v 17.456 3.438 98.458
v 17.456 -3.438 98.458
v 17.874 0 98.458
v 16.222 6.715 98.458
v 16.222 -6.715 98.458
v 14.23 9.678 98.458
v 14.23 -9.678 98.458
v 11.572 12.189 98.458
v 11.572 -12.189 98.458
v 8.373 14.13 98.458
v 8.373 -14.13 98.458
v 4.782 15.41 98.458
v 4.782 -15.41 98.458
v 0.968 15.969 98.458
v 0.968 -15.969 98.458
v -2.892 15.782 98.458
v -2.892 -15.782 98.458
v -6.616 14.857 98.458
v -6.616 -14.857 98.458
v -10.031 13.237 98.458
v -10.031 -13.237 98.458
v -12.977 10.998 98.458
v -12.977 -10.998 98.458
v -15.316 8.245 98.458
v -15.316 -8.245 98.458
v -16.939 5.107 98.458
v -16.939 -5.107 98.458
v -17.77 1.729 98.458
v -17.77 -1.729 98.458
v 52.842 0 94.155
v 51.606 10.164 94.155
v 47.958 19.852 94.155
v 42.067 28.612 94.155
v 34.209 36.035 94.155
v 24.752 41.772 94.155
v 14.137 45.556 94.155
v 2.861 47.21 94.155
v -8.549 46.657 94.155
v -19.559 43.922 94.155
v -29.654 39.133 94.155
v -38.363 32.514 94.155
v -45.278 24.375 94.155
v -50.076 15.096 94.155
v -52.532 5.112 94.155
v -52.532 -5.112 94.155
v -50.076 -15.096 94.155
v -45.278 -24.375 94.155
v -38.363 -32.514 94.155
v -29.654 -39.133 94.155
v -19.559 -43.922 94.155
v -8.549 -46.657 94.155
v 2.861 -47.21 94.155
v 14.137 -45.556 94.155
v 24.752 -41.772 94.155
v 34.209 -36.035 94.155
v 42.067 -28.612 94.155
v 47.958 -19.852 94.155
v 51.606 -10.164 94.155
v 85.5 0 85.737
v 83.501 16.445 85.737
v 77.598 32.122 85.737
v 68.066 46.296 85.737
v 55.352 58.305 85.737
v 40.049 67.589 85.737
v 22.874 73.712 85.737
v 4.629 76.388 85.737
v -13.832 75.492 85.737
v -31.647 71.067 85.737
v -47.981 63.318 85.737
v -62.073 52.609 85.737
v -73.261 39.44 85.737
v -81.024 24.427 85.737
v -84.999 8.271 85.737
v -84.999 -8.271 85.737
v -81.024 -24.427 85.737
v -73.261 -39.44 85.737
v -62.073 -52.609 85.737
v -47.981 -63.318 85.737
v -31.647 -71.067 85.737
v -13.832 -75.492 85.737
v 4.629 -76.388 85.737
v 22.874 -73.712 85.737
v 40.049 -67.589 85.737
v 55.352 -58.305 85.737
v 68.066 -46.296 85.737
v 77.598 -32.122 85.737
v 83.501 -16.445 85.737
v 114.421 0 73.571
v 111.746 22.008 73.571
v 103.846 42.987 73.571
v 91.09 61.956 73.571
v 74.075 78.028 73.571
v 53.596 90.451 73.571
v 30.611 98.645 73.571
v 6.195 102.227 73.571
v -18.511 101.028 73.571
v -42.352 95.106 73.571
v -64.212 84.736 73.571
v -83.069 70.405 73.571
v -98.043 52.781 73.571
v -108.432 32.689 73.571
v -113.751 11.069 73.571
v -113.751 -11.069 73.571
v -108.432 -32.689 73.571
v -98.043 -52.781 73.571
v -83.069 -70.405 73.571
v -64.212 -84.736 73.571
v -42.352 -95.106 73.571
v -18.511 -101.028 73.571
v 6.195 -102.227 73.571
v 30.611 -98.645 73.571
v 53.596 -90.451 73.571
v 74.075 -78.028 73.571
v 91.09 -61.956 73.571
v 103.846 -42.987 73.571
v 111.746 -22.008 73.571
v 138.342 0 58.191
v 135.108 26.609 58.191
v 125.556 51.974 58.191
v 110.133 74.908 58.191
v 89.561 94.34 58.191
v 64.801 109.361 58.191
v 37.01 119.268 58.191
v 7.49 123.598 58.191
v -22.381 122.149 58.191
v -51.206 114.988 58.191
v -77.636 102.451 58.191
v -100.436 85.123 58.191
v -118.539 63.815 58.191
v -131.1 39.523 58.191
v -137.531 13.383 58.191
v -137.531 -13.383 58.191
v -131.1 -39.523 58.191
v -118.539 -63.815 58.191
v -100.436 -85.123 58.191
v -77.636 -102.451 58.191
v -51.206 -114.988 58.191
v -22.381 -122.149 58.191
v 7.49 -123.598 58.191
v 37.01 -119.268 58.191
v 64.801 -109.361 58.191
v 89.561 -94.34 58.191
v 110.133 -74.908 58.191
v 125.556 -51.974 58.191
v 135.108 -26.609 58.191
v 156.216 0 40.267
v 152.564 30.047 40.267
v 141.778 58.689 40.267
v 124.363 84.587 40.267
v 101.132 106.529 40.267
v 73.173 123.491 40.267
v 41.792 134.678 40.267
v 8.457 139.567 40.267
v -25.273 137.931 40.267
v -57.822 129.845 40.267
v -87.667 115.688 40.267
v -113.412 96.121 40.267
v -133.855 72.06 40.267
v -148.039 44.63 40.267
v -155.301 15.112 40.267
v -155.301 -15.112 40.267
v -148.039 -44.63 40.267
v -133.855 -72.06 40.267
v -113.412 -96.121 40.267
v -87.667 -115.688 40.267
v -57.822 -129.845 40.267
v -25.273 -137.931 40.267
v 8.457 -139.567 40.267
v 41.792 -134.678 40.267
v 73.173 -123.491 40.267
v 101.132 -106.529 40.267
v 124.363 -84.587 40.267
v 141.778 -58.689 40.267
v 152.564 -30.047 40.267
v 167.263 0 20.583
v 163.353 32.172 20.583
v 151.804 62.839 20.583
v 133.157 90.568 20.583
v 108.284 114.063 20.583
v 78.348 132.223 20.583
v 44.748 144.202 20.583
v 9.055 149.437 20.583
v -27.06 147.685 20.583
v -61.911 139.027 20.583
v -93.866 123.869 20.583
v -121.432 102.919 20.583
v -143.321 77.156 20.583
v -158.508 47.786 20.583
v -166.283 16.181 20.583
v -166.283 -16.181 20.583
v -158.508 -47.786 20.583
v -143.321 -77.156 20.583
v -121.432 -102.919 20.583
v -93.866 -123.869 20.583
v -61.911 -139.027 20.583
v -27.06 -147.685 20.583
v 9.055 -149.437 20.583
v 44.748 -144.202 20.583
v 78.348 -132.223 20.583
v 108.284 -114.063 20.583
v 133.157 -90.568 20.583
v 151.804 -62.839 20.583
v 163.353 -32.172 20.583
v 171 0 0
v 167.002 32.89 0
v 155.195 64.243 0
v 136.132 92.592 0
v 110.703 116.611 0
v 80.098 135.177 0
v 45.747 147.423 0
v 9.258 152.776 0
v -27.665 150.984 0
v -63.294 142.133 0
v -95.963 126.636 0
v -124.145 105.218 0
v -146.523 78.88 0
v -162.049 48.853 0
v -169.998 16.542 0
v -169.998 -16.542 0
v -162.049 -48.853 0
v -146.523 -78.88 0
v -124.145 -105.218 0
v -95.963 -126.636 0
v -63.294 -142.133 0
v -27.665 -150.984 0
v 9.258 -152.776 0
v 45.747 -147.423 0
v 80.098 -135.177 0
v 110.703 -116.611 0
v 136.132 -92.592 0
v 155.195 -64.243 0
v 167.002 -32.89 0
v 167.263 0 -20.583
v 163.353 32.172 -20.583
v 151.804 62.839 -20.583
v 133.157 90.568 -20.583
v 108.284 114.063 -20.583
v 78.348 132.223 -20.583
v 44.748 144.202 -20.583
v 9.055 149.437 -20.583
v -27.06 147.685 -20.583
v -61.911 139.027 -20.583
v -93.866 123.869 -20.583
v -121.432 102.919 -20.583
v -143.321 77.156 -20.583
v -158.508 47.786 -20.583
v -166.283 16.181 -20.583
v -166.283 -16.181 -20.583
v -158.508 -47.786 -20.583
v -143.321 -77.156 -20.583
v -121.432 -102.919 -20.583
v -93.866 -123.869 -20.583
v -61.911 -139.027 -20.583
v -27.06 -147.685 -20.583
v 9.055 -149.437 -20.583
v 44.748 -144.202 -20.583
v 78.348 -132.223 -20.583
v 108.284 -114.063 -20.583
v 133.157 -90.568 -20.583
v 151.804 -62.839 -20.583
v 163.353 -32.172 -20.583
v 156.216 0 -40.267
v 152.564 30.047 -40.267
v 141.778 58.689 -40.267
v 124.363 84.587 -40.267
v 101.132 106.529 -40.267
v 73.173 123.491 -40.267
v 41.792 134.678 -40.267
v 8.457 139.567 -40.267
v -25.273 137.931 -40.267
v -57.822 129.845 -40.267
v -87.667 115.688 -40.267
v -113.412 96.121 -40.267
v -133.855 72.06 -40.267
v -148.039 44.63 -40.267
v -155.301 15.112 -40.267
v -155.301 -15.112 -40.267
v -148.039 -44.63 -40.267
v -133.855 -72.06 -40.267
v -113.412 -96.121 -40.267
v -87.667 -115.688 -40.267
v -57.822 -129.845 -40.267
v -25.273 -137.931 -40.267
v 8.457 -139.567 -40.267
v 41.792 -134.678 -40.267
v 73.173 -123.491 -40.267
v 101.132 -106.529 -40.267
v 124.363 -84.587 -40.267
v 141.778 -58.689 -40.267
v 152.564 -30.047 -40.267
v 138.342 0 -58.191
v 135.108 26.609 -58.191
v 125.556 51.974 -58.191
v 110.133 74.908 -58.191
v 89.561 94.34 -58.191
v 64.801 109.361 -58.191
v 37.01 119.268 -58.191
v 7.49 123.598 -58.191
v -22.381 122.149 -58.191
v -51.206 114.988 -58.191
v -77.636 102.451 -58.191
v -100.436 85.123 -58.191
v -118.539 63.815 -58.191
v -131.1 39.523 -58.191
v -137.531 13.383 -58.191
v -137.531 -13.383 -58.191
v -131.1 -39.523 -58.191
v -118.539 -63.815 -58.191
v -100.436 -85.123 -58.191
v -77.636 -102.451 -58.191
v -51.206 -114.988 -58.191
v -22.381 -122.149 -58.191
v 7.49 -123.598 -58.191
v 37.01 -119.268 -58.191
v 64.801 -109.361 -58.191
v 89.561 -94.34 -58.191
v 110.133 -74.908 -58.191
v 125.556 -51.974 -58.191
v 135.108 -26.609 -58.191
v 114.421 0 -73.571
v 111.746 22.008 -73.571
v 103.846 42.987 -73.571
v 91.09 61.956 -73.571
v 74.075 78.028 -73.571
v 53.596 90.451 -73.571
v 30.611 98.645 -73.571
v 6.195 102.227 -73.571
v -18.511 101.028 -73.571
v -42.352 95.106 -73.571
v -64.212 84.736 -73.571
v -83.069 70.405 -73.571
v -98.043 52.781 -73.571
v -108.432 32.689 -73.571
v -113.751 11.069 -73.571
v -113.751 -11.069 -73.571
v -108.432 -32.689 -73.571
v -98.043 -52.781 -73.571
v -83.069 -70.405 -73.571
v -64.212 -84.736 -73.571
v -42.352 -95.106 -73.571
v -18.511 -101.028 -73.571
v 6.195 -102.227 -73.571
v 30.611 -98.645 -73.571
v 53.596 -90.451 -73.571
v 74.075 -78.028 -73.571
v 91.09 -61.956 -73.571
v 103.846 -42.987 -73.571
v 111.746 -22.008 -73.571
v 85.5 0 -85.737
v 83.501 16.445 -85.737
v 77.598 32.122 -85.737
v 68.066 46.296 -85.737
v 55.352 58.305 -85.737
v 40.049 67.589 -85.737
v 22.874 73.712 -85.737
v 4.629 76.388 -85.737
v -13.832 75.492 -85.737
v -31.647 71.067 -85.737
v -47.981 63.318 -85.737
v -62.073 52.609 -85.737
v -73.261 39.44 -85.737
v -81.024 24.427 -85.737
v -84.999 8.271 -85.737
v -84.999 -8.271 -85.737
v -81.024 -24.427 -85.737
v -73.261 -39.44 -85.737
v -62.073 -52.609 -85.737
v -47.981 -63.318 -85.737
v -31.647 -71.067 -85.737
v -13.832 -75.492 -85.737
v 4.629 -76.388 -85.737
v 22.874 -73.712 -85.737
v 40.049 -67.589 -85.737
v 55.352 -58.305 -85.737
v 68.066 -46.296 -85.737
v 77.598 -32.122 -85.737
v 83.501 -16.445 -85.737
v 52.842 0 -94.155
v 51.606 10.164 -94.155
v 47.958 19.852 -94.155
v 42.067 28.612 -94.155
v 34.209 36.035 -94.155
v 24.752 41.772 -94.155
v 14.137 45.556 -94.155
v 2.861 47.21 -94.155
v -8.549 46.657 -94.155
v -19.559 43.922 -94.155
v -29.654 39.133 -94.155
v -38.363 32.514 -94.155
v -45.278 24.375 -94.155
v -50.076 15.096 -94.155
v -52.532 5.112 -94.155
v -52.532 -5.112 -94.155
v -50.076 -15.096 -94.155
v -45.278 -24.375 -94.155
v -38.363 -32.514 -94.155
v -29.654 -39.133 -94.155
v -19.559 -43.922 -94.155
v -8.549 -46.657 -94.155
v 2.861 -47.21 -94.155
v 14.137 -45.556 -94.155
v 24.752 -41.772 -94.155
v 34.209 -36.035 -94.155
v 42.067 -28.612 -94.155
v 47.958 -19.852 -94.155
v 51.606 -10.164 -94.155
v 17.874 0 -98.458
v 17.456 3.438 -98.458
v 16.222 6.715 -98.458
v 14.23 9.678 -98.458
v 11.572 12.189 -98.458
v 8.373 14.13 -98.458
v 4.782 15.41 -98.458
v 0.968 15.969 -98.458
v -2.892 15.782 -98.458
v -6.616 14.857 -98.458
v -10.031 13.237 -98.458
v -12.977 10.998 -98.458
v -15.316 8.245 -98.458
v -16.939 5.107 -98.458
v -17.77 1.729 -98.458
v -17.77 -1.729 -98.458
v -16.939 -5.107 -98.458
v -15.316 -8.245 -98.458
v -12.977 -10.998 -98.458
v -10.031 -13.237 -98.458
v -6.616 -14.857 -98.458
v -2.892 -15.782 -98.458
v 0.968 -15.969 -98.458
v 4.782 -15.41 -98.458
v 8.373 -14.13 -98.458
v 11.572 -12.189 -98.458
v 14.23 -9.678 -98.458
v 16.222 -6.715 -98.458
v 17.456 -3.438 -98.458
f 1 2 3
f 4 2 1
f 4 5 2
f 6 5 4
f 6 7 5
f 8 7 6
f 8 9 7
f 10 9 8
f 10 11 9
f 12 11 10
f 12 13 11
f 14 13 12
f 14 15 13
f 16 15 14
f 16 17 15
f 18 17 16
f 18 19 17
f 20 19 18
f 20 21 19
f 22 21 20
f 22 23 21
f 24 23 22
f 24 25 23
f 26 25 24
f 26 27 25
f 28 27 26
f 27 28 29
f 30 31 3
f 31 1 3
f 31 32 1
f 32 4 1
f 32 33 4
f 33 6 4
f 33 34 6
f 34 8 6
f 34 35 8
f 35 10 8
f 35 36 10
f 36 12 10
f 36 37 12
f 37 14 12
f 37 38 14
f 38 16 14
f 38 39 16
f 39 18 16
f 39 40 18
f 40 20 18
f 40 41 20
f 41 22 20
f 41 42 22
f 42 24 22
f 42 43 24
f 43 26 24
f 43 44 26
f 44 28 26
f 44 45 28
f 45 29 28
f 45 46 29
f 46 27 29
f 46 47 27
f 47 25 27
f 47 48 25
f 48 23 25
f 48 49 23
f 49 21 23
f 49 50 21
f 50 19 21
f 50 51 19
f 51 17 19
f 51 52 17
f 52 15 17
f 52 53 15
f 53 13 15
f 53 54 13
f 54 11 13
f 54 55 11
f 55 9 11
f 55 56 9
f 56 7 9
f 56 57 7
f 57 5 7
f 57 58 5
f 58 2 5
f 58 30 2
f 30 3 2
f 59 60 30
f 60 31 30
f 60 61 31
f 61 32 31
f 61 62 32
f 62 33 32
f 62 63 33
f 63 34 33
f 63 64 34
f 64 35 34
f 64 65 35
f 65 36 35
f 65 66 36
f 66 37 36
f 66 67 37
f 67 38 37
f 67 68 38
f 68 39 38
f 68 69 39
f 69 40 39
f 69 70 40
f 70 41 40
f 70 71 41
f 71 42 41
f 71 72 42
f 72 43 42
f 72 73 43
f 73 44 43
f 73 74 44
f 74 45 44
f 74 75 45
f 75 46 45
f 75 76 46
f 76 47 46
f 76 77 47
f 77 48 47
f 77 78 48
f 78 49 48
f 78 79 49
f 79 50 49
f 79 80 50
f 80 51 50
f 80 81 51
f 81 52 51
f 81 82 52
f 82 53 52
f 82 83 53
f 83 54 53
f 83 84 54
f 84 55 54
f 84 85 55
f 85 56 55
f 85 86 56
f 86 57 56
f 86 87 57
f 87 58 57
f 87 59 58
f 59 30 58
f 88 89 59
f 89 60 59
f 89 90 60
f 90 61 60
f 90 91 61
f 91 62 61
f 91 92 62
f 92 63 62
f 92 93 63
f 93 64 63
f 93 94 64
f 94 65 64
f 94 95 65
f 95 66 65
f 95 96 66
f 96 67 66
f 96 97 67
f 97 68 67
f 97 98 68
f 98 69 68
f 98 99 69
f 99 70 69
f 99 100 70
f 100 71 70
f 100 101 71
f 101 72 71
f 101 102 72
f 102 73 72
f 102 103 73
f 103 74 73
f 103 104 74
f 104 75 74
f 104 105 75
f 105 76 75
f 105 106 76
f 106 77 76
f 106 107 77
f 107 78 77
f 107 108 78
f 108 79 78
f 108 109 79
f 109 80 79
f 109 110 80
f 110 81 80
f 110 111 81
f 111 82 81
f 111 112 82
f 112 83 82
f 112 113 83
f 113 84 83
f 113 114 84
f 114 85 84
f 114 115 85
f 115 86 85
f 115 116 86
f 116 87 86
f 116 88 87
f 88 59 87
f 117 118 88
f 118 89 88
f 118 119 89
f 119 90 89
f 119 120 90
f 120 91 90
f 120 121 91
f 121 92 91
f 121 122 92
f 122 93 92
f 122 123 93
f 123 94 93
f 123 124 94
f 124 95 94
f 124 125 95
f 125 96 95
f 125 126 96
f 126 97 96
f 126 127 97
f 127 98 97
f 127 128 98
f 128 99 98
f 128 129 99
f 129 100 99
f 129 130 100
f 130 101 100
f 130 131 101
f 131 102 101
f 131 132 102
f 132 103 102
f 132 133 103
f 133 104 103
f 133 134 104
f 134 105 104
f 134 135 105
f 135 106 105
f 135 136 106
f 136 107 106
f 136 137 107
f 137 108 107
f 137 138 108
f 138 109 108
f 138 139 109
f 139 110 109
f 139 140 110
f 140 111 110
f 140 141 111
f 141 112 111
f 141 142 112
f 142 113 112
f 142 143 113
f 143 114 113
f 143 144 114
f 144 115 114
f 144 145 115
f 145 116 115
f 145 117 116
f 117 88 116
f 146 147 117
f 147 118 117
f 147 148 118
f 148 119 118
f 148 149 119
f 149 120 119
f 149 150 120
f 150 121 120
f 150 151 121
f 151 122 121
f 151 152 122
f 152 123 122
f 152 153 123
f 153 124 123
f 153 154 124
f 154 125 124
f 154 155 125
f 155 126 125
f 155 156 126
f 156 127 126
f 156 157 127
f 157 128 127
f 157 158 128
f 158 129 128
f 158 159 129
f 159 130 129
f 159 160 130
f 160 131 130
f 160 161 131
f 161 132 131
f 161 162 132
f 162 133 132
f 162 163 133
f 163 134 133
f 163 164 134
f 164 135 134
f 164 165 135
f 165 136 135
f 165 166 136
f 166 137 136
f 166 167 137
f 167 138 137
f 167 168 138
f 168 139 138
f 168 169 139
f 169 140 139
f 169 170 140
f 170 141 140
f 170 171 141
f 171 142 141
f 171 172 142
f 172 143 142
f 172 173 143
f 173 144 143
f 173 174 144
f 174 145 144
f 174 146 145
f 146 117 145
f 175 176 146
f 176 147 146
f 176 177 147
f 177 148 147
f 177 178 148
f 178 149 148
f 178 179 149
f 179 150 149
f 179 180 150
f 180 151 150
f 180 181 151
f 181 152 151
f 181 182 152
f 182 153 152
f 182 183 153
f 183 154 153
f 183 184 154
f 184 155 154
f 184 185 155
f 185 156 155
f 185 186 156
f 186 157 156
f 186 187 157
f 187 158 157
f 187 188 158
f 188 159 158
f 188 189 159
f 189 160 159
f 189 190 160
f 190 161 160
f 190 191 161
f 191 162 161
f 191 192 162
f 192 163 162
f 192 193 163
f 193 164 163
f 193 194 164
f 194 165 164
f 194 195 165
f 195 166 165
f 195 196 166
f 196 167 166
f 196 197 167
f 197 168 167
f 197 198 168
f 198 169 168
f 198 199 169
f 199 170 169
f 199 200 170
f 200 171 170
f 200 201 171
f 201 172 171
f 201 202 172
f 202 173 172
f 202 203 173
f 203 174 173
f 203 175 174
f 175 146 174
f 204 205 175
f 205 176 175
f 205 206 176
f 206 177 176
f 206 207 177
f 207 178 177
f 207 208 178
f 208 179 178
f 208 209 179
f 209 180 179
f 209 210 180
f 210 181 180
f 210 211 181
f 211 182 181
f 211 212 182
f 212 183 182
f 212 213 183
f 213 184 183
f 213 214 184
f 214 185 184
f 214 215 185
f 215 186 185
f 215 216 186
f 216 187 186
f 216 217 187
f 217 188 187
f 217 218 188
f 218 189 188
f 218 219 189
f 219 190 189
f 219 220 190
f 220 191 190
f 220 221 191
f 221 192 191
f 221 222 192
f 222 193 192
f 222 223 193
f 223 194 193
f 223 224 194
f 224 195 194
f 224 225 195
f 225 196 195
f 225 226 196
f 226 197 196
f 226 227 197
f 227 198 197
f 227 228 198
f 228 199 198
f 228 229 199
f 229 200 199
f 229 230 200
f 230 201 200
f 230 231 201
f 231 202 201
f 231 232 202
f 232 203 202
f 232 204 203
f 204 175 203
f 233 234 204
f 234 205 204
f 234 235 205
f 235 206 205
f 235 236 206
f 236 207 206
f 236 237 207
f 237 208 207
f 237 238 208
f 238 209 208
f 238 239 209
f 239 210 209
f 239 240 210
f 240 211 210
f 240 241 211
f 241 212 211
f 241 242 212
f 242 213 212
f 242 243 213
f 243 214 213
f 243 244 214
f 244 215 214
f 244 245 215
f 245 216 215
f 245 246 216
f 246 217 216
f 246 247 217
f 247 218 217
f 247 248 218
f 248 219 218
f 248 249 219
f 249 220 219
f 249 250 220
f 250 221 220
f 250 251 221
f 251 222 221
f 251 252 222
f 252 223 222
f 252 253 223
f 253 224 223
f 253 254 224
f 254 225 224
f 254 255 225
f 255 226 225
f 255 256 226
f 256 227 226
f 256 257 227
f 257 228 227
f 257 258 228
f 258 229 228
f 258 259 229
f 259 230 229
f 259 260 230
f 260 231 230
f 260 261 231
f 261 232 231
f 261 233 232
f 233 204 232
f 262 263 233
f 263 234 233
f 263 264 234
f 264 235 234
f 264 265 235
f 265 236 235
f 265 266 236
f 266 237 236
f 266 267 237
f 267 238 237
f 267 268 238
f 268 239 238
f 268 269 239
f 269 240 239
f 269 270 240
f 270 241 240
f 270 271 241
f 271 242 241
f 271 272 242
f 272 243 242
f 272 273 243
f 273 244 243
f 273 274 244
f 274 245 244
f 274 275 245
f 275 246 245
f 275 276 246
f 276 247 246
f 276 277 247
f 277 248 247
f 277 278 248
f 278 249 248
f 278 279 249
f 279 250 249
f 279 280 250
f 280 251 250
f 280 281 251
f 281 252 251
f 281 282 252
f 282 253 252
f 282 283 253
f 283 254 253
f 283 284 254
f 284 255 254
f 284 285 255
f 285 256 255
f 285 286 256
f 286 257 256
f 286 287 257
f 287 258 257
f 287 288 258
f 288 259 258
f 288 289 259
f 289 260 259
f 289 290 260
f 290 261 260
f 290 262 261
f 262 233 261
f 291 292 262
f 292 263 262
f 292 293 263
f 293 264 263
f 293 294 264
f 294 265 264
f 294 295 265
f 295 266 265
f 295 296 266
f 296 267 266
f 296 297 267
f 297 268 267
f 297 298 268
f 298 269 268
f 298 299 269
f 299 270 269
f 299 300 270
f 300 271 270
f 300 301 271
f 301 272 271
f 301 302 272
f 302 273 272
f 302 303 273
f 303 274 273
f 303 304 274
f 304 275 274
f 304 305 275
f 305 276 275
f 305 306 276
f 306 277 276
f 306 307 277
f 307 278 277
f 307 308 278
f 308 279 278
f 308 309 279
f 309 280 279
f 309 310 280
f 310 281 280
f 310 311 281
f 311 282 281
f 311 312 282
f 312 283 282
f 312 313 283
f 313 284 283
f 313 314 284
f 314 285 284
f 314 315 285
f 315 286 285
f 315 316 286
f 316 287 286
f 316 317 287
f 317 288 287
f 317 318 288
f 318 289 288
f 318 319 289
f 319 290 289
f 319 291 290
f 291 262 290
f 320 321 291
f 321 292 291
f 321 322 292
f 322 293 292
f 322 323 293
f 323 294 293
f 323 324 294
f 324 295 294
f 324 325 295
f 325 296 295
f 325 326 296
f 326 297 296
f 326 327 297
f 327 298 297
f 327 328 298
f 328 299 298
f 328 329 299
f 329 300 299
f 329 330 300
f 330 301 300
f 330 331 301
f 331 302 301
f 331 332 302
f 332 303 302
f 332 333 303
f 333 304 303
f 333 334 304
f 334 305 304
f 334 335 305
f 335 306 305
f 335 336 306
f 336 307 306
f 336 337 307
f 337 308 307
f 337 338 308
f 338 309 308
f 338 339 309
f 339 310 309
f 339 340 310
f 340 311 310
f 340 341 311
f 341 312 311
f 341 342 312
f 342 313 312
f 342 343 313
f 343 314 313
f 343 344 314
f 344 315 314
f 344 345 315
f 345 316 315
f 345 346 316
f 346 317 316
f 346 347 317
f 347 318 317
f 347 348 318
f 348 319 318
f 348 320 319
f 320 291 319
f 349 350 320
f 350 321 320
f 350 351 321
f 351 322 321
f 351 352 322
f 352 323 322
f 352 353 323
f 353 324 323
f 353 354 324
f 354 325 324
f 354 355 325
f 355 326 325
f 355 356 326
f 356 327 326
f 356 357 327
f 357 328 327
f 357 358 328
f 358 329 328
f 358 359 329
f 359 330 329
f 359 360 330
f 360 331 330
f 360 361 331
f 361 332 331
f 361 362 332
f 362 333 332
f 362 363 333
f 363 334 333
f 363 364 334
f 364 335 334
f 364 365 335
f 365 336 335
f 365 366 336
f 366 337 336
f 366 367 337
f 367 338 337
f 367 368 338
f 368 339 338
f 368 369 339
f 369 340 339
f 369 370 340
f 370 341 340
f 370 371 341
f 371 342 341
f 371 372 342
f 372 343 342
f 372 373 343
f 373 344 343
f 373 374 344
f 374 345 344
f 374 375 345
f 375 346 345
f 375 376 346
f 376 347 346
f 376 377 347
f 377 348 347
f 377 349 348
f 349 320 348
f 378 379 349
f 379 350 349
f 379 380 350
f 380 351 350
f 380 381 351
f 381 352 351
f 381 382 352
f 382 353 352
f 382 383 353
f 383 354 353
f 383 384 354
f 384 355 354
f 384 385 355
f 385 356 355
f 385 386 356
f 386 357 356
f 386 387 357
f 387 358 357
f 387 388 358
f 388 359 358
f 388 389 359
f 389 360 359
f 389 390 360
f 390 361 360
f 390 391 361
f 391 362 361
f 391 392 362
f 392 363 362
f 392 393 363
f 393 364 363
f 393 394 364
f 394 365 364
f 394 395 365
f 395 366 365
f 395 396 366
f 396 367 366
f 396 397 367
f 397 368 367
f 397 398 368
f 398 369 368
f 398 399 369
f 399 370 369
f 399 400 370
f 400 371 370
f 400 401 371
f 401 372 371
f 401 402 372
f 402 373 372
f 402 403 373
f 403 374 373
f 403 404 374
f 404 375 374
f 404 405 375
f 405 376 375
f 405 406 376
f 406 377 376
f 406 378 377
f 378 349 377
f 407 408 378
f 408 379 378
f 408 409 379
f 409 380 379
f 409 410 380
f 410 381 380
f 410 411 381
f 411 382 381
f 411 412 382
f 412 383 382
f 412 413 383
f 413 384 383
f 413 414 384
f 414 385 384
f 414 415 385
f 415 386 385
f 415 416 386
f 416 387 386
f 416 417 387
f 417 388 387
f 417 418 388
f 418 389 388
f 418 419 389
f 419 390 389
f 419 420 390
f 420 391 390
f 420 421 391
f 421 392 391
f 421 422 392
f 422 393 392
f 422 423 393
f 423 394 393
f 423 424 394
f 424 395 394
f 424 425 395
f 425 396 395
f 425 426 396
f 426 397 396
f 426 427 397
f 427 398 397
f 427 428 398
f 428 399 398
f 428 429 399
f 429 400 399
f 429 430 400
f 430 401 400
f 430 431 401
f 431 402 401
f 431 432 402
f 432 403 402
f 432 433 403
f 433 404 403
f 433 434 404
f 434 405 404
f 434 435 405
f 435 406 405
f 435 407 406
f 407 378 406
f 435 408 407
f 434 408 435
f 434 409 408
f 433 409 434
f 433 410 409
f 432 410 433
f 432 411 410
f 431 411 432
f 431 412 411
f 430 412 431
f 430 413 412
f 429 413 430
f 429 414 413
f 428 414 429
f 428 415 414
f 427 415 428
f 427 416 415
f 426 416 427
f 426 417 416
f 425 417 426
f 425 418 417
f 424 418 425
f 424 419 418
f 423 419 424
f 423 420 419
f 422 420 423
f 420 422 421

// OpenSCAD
// Generated by SolidPython 1.0.1 on 2020-07-29 00:46:54


scale(v = [19, 17, 11]) {
	sphere(r = 9);
}
/***********************************************
*********      SolidPython code:      **********
************************************************
 
# import packages: SolidPython
from solid import *
from solid.utils import *
from itertools import chain, combinations, permutations


class Resize:

    def __init__(self, scad_file):
        self.scad_file = scad_file
        #self.scad_file = import_scad(scad_file)
        # cone/cylinder param:
        self.r1 = 0
        self.r2 = 0
        self.h = 0
        # rectangular prism param:
        self.w = 0
        self.l = 0
        # ellipse param:
        self.r = 0

    # import OpenScad code (file name corresponds to shape)


    # classify shape + parameters
    def assign(self, param1, param2, param3):
        if self.scad_file == 'cone.scad':
            self.r1 = param1
            self.r2 = param2
            self.h = param3
        elif self.scad_file == 'cylinder.scad':
            self.r1 = param1
            self.r2 = param2
            self.h = param3
        elif self.scad_file == 'rectangularPrism.scad':
            self.h = param1
            self.l = param2
            self.w = param3
        else:
            self.r = param1
            self.h = param2

    # resize parameters
    def iterate(self):
        x = range(3, 20, 2)
        i = 1
        if self.scad_file == 'cone.scad':
            tempList = list(permutations(x, 2))
            for temp in tempList:
                param1 = temp[0]
                param2 = temp[1]
                filepath = 'produced_scad_files/' + 'cone' + str(param1) + '_' + str(param2) + '_' + '.scad'
                scad_render_to_file(cylinder(h=param1, r1=param2, r2=0), filepath)

        elif self.scad_file == 'cylinder.scad':
            tempList = list(permutations(x, 3))
            for temp in tempList:
                param1 = temp[0]
                param2 = temp[1]
                filepath = 'produced_scad_files/' + 'cylinder' + str(param1) + '_' + str(param2) + '_' + '.scad'
                scad_render_to_file(cylinder(h=param1, r1=param2, r2=param2), filepath)

        elif self.scad_file == 'rectangularPrism.scad':
            tempList = list(permutations(x, 3))
            for temp in tempList:
                param1 = temp[0]
                param2 = temp[1]
                param3 = temp[2]
                filepath = 'produced_scad_files/' + 'rectangularPrism' + str(param1) + '_' + str(param2) + '_' + str(
                    param3) + '.scad'
                scad_render_to_file(cube(size=(param1, param2, param3)), filepath)

        elif self.scad_file == 'ellipse.scad':
            tempList = list(permutations(x, 4))
            for temp in tempList:
                param1 = temp[0]
                param2 = temp[1]
                param3 = temp[2]
                param4 = temp[3]
                filepath = 'produced_scad_files/' + 'ellipse' + str(param1) + '_' + str(param2) + '_' + str(param3) + '_' + str(param4) + '.scad'
                scad_render_to_file(scale([param1, param2, param3])(sphere(r=param4)), filepath)

    def render_to_scadfile(self):
        scad_render_to_file(scad, 'example.scad') 
 
************************************************/
